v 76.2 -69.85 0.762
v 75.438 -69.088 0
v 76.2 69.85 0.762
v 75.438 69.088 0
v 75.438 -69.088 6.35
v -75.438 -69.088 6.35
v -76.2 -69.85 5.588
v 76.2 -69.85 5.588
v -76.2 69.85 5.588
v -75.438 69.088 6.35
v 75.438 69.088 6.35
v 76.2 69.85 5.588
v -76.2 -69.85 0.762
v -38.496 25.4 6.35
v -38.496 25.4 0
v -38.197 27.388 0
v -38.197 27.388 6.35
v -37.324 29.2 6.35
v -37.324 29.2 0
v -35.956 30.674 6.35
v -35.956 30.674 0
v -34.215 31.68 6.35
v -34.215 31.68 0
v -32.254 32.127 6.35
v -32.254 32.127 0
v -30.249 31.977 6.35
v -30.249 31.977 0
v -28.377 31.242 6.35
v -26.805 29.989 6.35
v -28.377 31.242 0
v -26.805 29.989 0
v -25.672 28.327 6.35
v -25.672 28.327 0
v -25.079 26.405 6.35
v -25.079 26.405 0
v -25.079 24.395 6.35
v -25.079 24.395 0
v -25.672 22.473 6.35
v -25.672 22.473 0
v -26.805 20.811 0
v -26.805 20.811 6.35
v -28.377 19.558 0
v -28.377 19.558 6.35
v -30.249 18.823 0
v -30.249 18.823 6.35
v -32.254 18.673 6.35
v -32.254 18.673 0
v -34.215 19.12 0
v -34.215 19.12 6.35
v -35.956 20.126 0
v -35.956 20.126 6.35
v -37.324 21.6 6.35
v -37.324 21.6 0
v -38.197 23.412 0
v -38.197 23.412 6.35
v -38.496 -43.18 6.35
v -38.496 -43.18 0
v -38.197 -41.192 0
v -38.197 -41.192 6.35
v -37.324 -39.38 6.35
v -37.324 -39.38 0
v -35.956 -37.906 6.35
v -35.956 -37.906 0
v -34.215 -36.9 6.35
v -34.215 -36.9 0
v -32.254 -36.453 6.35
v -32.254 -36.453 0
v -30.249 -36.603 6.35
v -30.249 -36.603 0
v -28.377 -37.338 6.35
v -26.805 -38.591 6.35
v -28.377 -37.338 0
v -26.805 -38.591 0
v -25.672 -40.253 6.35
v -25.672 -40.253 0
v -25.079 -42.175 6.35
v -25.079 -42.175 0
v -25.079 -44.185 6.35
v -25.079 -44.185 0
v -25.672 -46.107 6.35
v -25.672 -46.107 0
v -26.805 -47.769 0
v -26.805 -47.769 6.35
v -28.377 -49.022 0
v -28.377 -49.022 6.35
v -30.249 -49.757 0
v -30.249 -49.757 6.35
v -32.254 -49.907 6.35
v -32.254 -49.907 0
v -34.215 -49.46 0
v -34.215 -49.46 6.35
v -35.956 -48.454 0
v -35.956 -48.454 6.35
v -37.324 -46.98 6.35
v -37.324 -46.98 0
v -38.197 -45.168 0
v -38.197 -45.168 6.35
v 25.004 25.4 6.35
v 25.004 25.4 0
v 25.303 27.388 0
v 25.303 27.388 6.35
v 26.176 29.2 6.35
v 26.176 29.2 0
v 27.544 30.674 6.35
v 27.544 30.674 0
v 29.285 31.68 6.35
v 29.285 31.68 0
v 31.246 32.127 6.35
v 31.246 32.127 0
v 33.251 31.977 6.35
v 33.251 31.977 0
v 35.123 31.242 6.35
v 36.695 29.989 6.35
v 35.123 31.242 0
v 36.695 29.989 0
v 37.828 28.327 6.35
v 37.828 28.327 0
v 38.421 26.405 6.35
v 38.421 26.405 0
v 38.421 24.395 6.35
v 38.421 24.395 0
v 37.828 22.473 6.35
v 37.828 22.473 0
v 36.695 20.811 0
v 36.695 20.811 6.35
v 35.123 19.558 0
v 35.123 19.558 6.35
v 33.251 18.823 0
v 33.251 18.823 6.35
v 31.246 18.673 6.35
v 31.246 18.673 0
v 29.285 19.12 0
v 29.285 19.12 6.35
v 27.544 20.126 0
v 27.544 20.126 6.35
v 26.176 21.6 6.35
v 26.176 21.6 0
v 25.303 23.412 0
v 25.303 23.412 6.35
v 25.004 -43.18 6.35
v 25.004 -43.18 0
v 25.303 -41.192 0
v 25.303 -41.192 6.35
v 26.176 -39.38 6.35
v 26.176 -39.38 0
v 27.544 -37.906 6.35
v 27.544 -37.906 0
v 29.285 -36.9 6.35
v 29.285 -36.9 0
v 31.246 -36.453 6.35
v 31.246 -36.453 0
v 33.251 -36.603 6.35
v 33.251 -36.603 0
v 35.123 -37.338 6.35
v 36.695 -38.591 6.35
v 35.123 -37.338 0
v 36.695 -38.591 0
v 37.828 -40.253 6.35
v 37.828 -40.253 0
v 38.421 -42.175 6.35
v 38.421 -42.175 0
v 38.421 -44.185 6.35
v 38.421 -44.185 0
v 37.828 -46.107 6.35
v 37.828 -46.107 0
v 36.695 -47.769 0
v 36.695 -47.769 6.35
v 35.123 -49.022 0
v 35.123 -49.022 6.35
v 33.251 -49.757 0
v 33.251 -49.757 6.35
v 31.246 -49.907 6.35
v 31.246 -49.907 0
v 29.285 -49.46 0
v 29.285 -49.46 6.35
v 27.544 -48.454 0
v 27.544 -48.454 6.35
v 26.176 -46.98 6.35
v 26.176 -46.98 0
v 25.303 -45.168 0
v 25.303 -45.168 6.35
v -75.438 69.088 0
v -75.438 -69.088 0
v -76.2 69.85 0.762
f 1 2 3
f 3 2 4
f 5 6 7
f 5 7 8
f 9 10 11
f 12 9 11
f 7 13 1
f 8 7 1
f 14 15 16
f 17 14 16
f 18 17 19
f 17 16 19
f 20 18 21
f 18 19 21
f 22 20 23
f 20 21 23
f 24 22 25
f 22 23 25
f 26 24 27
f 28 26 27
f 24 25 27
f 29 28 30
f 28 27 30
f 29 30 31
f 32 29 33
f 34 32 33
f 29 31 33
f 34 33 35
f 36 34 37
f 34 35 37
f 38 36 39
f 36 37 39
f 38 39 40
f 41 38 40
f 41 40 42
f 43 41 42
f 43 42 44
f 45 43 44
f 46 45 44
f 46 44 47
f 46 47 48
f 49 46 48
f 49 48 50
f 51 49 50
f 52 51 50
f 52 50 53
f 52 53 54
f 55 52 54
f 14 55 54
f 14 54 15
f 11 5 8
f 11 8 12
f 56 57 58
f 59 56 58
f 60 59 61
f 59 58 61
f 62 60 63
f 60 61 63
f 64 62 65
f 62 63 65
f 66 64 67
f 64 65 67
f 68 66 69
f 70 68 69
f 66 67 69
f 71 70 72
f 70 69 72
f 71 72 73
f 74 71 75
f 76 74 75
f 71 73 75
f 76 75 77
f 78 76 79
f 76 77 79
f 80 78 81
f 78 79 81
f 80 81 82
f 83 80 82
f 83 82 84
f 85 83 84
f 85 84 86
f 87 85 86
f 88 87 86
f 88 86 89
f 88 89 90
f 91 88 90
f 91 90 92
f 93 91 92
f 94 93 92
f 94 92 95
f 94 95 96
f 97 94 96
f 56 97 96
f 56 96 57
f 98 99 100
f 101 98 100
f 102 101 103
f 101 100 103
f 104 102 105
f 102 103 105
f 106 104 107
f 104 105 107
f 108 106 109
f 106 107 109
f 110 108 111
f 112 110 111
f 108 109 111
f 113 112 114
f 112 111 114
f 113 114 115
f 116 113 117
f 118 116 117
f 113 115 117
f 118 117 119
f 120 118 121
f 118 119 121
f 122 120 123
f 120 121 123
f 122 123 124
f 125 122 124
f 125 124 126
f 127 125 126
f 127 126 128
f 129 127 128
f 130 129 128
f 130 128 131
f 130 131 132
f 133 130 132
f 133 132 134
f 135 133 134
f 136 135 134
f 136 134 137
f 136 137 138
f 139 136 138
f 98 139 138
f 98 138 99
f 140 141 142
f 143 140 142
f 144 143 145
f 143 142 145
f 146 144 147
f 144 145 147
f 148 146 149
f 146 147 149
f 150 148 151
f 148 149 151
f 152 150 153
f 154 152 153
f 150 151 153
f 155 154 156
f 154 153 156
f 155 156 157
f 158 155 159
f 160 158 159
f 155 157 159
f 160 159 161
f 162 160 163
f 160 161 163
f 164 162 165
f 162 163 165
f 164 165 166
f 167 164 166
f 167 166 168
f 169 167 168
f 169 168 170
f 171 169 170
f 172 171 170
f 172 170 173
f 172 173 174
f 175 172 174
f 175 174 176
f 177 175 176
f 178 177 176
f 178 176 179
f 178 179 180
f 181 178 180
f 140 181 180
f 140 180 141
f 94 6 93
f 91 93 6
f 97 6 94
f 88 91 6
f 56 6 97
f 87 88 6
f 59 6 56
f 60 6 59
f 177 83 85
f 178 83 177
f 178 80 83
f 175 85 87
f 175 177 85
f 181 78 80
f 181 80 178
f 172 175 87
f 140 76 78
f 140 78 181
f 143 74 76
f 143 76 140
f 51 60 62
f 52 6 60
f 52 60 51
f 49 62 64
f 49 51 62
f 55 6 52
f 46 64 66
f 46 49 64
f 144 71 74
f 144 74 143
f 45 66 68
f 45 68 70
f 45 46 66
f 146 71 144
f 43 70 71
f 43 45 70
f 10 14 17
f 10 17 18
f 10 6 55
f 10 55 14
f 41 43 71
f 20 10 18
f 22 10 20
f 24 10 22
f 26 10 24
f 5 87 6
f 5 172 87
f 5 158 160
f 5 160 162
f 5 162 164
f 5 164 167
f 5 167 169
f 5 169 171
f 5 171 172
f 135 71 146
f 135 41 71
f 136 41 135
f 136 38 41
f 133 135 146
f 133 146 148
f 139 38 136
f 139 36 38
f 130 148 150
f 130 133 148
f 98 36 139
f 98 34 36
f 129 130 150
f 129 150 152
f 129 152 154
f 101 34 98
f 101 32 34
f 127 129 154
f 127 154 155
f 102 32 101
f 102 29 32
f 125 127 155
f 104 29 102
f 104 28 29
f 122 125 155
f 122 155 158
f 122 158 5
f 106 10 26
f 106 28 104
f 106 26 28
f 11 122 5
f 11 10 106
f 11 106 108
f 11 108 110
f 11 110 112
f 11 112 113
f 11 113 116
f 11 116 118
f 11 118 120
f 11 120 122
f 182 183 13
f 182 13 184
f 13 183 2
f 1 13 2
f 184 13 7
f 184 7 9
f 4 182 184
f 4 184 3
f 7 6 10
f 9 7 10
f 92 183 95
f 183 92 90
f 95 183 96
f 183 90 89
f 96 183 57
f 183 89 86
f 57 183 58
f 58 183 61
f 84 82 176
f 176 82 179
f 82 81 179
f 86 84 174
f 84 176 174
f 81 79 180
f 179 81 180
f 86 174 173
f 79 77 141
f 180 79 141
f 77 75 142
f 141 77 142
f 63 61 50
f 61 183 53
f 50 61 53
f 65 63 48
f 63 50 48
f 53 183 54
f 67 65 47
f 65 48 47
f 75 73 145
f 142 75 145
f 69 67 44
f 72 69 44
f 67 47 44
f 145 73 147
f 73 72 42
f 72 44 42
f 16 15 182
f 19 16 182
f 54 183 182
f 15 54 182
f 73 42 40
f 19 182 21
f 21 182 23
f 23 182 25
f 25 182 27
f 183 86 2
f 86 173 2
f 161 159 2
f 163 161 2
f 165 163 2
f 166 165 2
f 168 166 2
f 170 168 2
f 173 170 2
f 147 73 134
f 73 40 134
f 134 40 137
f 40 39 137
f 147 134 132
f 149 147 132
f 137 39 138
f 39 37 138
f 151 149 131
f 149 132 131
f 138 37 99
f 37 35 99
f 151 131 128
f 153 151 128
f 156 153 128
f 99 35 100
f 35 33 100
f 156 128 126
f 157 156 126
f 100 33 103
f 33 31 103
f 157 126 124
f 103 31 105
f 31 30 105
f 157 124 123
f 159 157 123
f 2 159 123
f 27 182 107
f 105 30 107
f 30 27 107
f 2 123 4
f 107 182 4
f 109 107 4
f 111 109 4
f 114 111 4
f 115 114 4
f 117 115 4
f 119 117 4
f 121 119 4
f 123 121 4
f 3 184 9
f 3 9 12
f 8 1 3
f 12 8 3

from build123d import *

# Parameters (mm, degrees)
SKETCH1_W               = 152.4
SKETCH1_H               = 139.7
EXTRUDE1_DEPTH          = 6.35
CHAMFER1_SIZE           = 0.762
F_1_2_CLEARANCE_HOLE1_D = 13.49248


with BuildPart() as part:
    # Sketch1 → Extrude1 (new body)
    with BuildSketch(Plane.XY):
        Rectangle(SKETCH1_W, SKETCH1_H)
    extrude(amount=EXTRUDE1_DEPTH)

    # Chamfer1
    chamfer1_edges = [part.edges().sort_by_distance(p)[0] for p in [
        (76.2, 0, 6.35),
        (0, 69.85, 6.35),
        (-76.2, 0, 6.35),
        (0, 69.85, 0),
        (76.2, 0, 0),
        (0, -69.85, 0),
        (-76.2, 0, 0),
        (0, -69.85, 6.35),
    ]]
    chamfer(chamfer1_edges, length=CHAMFER1_SIZE)

    # 1/2 Clearance Hole1 (through all)
    with Locations(Plane.XY.offset(6.35)):
        with Locations((-31.75, 25.4), (31.75, 25.4), (-31.75, -43.18), (31.75, -43.18)):
            Hole(F_1_2_CLEARANCE_HOLE1_D / 2)


solid = part.part
